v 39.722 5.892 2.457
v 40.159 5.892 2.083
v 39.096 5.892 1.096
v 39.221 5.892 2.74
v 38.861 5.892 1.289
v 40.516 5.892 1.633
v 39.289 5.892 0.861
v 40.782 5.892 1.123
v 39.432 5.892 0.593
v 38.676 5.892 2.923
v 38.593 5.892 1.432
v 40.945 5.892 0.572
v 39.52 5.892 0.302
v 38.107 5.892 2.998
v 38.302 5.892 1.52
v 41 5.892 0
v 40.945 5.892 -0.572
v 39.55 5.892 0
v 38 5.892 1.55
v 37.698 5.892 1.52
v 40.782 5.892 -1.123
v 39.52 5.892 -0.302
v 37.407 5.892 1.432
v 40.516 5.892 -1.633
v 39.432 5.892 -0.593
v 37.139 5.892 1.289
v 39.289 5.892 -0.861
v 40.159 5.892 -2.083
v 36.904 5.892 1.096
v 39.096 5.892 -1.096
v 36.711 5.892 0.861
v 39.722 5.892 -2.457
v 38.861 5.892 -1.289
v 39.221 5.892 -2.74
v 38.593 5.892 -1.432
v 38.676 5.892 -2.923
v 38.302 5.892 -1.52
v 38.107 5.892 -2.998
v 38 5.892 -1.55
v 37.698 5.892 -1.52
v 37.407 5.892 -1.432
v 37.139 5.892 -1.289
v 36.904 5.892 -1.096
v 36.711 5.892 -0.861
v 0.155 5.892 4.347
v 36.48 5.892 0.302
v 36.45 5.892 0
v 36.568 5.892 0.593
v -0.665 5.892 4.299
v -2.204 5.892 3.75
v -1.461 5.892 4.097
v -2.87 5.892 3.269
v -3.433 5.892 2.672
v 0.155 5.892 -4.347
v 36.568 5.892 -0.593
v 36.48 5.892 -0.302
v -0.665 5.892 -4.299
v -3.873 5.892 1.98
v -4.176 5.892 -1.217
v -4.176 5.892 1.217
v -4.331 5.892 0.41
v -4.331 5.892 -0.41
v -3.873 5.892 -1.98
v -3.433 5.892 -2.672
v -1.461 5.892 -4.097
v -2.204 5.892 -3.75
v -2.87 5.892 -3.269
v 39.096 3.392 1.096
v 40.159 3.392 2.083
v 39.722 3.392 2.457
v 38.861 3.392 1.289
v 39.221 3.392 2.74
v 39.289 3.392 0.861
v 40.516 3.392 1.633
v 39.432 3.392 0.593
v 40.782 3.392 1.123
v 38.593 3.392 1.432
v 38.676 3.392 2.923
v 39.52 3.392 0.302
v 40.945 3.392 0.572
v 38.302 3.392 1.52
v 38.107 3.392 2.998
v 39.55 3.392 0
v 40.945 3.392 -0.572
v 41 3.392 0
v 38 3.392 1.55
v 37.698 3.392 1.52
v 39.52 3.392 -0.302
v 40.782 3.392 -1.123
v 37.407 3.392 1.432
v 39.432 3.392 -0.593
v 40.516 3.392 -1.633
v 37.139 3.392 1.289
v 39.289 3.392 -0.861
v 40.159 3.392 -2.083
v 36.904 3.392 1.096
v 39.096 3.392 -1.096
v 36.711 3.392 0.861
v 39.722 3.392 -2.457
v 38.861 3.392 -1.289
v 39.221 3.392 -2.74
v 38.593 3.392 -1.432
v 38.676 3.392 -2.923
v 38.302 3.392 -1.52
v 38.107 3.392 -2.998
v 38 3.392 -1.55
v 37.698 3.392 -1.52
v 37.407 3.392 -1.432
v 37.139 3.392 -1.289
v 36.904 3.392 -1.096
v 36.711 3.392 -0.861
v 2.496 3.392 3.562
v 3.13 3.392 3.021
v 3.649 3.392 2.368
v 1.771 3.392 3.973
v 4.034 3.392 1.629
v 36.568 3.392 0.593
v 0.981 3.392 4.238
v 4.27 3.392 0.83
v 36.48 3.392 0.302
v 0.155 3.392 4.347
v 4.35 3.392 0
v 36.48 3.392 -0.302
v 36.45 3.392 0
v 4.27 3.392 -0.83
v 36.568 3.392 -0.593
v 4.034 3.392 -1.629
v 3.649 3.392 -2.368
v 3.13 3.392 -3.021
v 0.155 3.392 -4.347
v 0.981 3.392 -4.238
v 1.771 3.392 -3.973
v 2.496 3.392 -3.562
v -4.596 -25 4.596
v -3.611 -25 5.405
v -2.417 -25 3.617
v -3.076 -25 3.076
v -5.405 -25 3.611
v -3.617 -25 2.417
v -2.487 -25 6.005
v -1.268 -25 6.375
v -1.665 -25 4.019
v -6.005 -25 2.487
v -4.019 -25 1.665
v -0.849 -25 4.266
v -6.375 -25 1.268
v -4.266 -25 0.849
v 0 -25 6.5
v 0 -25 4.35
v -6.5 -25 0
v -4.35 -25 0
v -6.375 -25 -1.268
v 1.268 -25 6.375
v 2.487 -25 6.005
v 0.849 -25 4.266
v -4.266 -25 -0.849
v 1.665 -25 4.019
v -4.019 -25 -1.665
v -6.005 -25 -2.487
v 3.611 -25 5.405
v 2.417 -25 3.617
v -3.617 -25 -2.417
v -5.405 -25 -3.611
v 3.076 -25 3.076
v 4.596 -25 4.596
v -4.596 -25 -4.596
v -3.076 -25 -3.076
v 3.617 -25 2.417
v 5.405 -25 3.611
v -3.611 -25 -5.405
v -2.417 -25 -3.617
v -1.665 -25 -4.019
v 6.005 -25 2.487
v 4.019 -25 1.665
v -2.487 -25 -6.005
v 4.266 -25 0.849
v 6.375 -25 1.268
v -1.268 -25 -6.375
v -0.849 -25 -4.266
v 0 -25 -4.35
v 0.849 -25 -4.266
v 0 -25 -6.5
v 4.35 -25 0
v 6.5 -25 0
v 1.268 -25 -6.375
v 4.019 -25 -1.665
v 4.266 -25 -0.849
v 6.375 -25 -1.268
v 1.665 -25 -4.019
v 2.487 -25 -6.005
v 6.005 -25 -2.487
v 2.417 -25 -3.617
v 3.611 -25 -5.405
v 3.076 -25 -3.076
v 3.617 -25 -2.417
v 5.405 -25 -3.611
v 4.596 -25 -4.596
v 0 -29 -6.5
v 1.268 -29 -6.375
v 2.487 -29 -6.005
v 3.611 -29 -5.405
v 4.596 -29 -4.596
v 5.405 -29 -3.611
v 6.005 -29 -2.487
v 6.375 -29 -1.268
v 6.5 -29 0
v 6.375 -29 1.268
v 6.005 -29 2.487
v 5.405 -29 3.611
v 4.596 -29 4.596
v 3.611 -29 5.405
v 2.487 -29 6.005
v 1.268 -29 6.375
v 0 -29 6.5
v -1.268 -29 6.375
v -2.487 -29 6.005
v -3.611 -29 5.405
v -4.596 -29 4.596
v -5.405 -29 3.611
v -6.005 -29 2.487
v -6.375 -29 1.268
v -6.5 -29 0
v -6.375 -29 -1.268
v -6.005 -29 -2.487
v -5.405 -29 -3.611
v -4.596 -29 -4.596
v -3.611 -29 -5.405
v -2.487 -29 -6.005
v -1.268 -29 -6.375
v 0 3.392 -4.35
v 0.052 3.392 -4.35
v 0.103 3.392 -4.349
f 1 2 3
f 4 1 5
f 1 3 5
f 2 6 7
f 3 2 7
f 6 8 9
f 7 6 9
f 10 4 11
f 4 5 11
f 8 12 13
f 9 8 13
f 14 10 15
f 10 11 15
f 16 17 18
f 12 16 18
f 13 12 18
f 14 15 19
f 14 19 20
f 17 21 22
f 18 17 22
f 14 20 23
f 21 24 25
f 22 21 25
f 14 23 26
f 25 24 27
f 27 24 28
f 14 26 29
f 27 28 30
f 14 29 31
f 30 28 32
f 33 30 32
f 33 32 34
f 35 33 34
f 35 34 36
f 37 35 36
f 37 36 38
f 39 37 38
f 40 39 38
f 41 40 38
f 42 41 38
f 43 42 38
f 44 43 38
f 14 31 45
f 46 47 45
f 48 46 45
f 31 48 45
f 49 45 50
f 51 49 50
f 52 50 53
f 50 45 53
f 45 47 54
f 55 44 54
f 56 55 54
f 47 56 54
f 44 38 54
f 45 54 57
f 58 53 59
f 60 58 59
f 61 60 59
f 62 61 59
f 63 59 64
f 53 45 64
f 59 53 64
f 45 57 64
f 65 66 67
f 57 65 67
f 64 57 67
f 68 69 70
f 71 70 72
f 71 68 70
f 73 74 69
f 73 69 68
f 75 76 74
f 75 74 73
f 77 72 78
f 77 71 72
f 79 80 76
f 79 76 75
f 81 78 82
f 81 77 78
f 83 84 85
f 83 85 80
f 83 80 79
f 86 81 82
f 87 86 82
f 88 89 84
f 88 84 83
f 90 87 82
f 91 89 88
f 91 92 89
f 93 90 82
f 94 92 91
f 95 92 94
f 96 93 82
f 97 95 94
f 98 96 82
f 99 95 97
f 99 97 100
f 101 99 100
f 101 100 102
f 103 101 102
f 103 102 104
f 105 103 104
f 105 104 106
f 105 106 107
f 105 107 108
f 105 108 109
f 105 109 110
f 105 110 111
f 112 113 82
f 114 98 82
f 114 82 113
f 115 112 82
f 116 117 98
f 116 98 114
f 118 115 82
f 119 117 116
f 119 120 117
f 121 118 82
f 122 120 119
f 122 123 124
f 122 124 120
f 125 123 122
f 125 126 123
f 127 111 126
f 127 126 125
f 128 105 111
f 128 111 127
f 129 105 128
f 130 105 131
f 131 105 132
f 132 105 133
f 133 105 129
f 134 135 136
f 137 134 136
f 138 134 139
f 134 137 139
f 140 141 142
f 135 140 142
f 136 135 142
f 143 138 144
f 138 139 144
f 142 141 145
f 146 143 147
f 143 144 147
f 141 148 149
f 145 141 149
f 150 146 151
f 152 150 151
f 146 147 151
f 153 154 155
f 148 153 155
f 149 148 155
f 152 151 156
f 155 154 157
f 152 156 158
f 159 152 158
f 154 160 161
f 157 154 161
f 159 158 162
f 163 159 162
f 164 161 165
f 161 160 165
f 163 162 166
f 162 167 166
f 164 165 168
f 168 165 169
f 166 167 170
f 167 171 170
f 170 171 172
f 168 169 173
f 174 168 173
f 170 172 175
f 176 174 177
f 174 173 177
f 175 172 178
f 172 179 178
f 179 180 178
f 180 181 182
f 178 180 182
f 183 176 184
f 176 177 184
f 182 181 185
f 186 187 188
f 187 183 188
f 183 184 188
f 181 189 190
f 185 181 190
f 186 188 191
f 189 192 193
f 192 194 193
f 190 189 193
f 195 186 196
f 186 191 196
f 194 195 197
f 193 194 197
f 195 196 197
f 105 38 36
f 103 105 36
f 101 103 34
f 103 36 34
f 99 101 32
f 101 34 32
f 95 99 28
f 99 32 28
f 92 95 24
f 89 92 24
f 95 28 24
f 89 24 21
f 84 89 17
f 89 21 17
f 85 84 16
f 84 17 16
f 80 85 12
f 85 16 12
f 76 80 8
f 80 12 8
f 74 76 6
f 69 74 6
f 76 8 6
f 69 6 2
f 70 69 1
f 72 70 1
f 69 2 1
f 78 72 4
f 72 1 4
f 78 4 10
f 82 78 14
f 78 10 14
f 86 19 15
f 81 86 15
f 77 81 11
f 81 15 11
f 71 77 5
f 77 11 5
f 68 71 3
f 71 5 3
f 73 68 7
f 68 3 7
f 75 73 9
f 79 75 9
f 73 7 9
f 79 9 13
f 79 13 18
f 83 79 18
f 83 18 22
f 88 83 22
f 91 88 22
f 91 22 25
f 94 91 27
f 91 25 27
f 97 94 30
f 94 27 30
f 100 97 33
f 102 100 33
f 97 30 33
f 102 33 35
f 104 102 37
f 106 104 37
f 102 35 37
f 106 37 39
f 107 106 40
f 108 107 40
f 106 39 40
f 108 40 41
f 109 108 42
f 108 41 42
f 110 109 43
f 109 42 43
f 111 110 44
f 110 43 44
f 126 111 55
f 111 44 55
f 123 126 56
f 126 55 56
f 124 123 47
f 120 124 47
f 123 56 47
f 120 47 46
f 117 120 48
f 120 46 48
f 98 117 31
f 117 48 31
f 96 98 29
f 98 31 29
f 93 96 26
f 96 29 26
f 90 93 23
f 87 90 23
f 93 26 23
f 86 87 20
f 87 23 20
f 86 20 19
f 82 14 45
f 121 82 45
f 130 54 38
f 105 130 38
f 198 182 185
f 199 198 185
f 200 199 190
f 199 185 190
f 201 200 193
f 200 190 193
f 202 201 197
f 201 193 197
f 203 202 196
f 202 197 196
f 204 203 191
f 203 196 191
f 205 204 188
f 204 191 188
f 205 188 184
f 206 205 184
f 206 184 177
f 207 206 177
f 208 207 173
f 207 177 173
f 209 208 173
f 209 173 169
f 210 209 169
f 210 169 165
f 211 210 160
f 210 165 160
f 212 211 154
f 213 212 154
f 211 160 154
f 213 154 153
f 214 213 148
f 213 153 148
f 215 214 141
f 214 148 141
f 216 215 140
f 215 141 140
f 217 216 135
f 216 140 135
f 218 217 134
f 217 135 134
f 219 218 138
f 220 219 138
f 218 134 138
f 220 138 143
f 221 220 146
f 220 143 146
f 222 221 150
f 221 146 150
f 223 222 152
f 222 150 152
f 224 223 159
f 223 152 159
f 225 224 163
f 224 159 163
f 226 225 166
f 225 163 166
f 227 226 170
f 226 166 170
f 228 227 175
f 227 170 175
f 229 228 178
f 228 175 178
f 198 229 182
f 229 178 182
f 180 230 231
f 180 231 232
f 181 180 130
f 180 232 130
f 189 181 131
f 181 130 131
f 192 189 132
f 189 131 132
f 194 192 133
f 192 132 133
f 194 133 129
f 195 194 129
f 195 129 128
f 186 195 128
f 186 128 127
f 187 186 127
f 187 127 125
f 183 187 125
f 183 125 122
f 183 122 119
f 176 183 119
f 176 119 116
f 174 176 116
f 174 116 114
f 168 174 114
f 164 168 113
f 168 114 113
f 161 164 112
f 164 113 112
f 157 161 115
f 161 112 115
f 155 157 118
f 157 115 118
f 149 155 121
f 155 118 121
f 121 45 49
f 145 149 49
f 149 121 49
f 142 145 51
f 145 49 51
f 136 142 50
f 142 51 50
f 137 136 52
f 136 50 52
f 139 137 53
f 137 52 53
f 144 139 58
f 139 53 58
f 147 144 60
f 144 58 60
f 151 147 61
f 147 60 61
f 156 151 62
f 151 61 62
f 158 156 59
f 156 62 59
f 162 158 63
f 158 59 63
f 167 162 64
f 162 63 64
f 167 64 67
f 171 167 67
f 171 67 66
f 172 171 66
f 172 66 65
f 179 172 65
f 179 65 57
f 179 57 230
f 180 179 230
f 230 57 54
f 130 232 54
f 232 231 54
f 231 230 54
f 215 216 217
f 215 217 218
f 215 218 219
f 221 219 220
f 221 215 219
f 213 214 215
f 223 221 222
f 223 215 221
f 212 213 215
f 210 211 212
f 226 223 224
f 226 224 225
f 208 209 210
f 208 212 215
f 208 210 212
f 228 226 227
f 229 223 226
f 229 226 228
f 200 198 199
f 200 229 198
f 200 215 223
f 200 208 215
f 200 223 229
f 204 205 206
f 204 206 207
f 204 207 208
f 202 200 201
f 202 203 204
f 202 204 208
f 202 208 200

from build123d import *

# Parameters (mm, degrees)
SKETCH_2_R          = 1.5
CUT_EXTRUDE_5_DEPTH = 10
SKETCH_3_R          = 2.5
EXTRUDE_1_DEPTH     = 20
SKETCH_4_R          = 1.85
EXTRUDE_2_DEPTH     = 5
SKETCH_3_2_R        = 2.5
EXTRUDE_3_DEPTH     = 5.891507394
SKETCH_5_R          = 4.35
EXTRUDE_4_DEPTH     = 25
SKETCH_6_R          = 6.5
EXTRUDE_5_DEPTH     = 4
SKETCH_7_OUTSIDE_W  = 65.264
SKETCH_7_OUTSIDE_H  = 65.264
CUT_EXTRUDE_6_DEPTH = 5
SKETCH_8_R          = 1.55
EXTRUDE_6_DEPTH     = 2.5


with BuildPart() as part:
    # 草图1 → 旋转1 (revolve)
    with BuildSketch(Plane.XY, mode=Mode.PRIVATE) as revolve_1_sk:
        Polygon((3.461552813, 5.891507394), (1.4, 5.891507394), (1.4, 3.5), (2.5, 3.5), (2.5, 0), (4.35, 0), (4.35, 3.391507394), (24, 3.391507394), (24, 5.891507394), align=None)
    revolve(revolve_1_sk.sketch.rotate(Axis((0, 0, 0), (0, 1, 0)), 90), axis=Axis((0, 0, 0), (0, 1, 0)))

    # 草图2 → 切除-拉伸5 (cut)
    with BuildSketch(Plane(origin=(0, 5.891507394, 0), x_dir=(1, 0, 0), z_dir=(0, 1, 0))):
        with Locations(Location((-16, 0, 0), (0, 0, 270))):
            Circle(SKETCH_2_R)
        with Locations(Location((0, -16, 0), (0, 0, 270))):
            Circle(SKETCH_2_R)
        with Locations(Location((16, 0, 0), (0, 0, 270))):
            Circle(SKETCH_2_R)
        with Locations(Location((0, 16, 0), (0, 0, 270))):
            Circle(SKETCH_2_R)
    extrude(amount=-CUT_EXTRUDE_5_DEPTH, mode=Mode.SUBTRACT)



with BuildPart() as body_2:
    # 草图3 → 凸台-拉伸1 (new body)
    with BuildSketch(Plane.XZ):
        with Locations(Location((0, 0, 0), (0, 0, 270))):
            Circle(SKETCH_3_R)
    extrude(amount=EXTRUDE_1_DEPTH)

    # 草图4 → 凸台-拉伸2 (add)
    with BuildSketch(Plane.XZ.offset(20)):
        with Locations(Location((0, 0, 0), (0, 0, 270))):
            Circle(SKETCH_4_R)
    extrude(amount=EXTRUDE_2_DEPTH)


with BuildPart() as part_1:
    add(part.part)

    add(body_2.part)  # 凸台-拉伸3 merges body 2
    # 草图3<2> → 凸台-拉伸3 (add)
    with BuildSketch(Plane.XZ):
        with Locations(Location((0, 0, 0), (0, 0, 270))):
            Circle(SKETCH_3_2_R)
    extrude(amount=-EXTRUDE_3_DEPTH)

    # 草图5 → 凸台-拉伸4 (add, through all)
    with BuildSketch(Plane.XZ):
        with Locations(Location((0, 0, 0), (0, 0, 270))):
            Circle(SKETCH_5_R)
    extrude(amount=EXTRUDE_4_DEPTH)

    # 草图6 → 凸台-拉伸5 (add)
    with BuildSketch(Plane.XZ.offset(25)):
        with Locations(Location((0, 0, 0), (0, 0, 270))):
            Circle(SKETCH_6_R)
    extrude(amount=EXTRUDE_5_DEPTH)

    # 草图7 outside → 切除-拉伸6 (cut)
    with BuildSketch(Plane(origin=(0, 5.891507394, 0), x_dir=(1, 0, 0), z_dir=(0, 1, 0))):
        Rectangle(SKETCH_7_OUTSIDE_W, SKETCH_7_OUTSIDE_H)
        with BuildLine():
            Line((0.36703125, 4.334488212), (16.253125, 2.989302215))
            ThreePointArc((16.253125, 2.989302215), (19, 0), (16.253125, -2.989302215))
            Line((16.253125, -2.989302215), (0.36703125, -4.334488212))
            ThreePointArc((0.36703125, -4.334488212), (-4.35, 0), (0.36703125, 4.334488212))
        make_face(mode=Mode.SUBTRACT)
    extrude(amount=-CUT_EXTRUDE_6_DEPTH, mode=Mode.SUBTRACT)

    # 草图8 → 凸台-拉伸6 (add)
    with BuildSketch(Plane(origin=(0, 5.891507394, 0), x_dir=(1, 0, 0), z_dir=(0, 1, 0))):
        with BuildLine():
            Line((0.154539474, 4.347254024), (38.106578947, 2.998106224))
            ThreePointArc((38.106578947, 2.998106224), (41, 0), (38.106578947, -2.998106224))
            Line((38.106578947, -2.998106224), (0.154539474, -4.347254024))
            ThreePointArc((0.154539474, -4.347254024), (-4.35, 0), (0.154539474, 4.347254024))
        make_face()
        with Locations(Location((38, 0, 0), (0, 0, 270))):
            Circle(SKETCH_8_R, mode=Mode.SUBTRACT)
    extrude(amount=-EXTRUDE_6_DEPTH)


solid = part_1.part
